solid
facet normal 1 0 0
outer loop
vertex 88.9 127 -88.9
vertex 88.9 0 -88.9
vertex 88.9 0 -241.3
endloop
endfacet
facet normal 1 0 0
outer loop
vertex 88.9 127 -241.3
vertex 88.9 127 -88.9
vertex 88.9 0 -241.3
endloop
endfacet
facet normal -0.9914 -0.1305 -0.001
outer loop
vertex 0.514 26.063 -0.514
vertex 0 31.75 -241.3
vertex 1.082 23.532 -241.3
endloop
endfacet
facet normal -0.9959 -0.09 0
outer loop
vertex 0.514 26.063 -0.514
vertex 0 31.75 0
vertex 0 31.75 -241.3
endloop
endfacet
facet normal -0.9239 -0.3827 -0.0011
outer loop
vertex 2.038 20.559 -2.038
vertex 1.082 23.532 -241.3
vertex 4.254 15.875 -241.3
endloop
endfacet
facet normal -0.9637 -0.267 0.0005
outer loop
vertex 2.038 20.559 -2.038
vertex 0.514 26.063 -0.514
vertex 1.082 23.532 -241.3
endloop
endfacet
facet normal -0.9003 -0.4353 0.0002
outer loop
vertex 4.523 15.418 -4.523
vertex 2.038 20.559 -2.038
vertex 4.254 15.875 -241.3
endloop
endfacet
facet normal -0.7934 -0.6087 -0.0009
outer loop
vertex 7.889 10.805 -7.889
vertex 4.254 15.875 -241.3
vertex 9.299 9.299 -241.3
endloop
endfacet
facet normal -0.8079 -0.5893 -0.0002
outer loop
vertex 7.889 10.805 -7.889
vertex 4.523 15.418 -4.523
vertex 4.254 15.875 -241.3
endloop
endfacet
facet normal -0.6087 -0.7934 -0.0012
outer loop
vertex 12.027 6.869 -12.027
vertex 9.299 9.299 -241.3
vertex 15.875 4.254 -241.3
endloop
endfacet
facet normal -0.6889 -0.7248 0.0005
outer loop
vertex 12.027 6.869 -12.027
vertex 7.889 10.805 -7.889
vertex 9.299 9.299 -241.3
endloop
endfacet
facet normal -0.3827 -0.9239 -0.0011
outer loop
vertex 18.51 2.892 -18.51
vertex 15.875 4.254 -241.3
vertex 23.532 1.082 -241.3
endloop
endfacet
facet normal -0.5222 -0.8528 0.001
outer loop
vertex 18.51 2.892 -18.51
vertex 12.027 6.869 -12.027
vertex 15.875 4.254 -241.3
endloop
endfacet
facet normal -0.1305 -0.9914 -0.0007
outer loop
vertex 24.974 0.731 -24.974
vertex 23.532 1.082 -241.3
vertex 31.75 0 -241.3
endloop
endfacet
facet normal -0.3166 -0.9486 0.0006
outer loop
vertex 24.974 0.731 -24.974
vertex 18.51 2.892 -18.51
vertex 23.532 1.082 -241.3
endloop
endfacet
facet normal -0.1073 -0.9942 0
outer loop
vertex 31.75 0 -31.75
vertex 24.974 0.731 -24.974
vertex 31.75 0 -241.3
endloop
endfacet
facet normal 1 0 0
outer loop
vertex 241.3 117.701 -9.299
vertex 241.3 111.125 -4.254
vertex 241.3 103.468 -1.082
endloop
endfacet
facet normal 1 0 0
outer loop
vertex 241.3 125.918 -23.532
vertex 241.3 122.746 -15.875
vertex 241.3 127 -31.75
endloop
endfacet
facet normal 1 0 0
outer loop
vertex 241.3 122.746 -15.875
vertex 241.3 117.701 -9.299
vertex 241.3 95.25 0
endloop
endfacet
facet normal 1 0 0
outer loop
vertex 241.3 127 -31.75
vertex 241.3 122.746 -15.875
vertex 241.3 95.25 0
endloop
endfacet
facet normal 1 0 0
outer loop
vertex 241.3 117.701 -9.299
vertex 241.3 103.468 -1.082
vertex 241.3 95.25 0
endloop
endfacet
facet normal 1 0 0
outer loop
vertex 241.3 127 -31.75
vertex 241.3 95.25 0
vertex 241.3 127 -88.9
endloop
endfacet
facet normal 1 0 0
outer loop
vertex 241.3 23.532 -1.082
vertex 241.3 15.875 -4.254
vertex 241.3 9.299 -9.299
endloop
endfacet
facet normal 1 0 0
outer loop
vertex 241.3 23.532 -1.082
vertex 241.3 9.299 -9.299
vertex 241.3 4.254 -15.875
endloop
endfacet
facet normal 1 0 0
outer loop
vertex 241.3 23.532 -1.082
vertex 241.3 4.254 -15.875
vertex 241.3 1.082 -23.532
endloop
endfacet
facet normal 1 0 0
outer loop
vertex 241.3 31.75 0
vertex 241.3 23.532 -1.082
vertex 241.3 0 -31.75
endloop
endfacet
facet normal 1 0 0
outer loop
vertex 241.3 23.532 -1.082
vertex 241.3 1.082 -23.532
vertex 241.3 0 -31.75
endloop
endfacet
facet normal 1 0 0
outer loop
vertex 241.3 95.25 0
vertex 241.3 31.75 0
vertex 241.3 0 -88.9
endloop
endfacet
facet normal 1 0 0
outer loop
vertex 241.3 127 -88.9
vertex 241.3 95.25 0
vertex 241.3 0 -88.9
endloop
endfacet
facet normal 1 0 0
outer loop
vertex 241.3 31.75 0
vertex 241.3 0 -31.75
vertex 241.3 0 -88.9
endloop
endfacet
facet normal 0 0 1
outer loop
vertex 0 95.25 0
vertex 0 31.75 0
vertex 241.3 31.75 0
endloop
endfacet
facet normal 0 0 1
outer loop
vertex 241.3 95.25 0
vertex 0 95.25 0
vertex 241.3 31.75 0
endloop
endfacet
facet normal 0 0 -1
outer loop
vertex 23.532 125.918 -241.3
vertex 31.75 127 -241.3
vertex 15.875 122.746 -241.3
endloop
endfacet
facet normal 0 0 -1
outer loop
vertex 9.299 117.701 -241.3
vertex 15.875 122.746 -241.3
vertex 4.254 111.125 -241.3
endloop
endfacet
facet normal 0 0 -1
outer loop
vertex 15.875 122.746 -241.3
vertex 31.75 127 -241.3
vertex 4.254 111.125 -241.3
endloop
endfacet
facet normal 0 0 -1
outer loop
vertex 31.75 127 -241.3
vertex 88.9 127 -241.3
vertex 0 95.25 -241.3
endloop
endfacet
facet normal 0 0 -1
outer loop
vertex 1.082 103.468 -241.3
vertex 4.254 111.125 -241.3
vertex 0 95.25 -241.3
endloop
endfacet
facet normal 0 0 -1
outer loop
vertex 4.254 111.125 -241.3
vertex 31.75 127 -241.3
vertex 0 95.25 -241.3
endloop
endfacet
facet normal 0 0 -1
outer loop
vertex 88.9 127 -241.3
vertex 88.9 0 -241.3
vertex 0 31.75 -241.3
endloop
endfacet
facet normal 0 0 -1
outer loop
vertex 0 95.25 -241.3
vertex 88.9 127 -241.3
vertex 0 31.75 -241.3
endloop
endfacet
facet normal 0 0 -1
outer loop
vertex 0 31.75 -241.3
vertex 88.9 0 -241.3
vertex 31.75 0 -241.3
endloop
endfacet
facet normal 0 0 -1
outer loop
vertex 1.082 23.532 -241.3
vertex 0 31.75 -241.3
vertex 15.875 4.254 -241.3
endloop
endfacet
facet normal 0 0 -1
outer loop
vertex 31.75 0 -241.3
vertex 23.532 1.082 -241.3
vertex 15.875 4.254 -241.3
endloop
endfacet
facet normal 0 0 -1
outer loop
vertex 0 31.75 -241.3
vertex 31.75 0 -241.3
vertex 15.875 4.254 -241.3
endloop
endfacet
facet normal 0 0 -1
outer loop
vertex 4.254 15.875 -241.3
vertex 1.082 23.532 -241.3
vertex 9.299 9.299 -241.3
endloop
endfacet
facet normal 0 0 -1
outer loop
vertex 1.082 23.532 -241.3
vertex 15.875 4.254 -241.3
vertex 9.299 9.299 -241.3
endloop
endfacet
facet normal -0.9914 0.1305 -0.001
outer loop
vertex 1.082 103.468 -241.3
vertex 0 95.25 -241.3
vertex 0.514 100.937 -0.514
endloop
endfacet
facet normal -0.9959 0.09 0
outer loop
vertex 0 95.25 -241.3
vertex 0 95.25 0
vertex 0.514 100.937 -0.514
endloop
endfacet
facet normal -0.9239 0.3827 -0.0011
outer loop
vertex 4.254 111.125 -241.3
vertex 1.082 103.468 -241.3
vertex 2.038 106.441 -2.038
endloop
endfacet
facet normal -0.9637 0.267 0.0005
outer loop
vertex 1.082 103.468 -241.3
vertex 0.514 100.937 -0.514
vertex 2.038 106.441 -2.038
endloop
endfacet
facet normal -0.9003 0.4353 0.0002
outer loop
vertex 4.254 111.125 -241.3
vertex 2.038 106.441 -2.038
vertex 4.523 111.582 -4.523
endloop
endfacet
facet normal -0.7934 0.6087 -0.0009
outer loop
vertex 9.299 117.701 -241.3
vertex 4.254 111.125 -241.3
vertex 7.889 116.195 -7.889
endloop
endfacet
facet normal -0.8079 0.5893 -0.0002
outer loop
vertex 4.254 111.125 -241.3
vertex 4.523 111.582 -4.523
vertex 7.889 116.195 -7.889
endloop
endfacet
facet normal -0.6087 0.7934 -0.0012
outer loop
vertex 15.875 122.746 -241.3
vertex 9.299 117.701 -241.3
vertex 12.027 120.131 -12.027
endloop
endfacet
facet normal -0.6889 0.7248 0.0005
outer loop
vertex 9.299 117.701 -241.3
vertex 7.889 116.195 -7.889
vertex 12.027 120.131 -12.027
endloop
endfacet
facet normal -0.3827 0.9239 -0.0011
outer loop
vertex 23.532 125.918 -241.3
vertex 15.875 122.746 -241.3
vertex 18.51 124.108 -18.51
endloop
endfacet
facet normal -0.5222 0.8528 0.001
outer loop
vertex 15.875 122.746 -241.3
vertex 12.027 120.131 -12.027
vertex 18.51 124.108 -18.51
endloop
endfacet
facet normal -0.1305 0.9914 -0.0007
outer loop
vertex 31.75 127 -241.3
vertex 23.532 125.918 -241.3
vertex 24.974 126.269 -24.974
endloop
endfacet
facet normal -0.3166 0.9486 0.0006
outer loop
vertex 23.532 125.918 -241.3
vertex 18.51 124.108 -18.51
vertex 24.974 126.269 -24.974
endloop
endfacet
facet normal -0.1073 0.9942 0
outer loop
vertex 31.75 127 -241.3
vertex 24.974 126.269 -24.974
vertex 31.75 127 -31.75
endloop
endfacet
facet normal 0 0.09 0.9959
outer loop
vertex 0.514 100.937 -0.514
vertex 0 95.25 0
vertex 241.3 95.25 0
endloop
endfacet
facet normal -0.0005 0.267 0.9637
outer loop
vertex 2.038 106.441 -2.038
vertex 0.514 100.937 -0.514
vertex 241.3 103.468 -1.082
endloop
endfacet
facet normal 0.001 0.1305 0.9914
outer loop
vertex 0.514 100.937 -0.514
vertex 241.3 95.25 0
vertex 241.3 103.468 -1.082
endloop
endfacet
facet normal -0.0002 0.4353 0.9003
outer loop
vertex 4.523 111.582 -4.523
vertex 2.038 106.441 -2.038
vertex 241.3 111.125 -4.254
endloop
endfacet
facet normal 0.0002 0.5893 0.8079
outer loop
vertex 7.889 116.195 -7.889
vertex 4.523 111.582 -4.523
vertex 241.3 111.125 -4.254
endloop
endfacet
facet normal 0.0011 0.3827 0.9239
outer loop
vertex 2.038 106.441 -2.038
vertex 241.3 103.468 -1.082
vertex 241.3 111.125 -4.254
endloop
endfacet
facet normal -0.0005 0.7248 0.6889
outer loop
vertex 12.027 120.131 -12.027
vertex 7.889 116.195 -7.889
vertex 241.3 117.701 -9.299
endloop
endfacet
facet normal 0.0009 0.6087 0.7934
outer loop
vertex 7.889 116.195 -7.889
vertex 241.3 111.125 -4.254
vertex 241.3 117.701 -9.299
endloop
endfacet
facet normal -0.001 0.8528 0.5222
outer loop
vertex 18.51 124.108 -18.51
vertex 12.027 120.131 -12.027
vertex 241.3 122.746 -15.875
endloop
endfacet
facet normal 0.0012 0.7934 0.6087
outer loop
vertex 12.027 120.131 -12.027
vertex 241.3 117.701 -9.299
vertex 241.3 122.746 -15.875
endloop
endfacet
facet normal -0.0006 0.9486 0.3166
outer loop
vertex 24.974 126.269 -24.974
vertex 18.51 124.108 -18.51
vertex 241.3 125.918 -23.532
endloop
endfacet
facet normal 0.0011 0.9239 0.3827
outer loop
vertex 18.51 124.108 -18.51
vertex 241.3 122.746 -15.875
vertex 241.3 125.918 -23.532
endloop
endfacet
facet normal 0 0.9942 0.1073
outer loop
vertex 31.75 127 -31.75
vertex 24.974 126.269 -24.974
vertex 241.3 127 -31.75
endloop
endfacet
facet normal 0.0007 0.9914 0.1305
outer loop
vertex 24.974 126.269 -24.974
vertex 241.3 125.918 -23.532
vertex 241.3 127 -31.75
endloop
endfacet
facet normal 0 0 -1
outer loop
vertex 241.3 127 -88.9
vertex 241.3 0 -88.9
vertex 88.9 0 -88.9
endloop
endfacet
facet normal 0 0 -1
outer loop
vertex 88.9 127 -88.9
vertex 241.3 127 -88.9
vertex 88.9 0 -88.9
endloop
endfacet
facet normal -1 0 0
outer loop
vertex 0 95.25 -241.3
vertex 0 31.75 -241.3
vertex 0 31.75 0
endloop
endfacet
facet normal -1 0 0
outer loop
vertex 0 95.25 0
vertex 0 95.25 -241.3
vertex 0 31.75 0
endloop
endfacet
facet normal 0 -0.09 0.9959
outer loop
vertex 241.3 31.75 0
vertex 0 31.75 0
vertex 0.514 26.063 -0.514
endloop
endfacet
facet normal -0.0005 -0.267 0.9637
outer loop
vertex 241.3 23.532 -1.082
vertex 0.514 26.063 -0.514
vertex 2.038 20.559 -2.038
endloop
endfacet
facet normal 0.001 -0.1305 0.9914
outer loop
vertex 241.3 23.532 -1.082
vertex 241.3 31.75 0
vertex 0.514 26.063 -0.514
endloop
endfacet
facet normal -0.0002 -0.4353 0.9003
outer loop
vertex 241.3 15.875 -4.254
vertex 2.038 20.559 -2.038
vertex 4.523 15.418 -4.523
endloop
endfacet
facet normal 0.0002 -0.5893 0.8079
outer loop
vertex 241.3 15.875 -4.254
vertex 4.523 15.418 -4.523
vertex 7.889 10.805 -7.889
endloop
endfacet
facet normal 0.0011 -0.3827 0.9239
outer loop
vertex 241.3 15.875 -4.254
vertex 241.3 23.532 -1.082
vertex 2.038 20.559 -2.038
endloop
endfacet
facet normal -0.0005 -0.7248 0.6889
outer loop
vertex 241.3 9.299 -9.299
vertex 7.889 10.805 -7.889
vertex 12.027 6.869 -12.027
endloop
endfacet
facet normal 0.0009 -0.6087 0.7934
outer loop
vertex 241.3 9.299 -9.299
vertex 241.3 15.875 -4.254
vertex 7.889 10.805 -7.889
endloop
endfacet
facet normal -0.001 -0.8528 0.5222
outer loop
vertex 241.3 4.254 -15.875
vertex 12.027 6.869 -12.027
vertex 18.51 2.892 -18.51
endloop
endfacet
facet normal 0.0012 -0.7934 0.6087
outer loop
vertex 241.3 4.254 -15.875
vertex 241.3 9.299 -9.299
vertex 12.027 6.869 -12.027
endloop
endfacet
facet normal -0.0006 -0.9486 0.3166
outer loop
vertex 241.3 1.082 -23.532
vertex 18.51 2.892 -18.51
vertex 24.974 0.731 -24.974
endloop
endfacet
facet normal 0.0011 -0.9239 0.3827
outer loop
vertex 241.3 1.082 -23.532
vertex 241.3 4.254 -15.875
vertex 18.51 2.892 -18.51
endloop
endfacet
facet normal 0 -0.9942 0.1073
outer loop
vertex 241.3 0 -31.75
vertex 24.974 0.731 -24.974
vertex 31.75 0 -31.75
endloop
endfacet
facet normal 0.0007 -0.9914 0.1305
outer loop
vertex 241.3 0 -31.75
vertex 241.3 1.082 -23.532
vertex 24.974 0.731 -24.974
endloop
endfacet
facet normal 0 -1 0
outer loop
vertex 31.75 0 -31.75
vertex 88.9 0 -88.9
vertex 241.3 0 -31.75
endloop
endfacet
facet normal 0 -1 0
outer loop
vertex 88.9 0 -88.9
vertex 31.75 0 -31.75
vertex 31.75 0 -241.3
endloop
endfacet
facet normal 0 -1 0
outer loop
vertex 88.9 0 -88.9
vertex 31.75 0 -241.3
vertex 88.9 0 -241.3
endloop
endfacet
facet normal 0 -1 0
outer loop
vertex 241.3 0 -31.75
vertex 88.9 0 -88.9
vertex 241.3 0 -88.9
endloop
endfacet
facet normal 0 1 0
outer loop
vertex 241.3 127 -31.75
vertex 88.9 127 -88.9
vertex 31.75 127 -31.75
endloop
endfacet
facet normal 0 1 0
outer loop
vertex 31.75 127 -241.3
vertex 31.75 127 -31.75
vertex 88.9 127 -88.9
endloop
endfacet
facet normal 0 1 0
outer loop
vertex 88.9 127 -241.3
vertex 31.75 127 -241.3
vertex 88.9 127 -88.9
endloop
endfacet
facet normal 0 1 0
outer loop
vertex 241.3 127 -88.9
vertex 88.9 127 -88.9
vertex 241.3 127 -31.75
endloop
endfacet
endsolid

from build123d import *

# Parameters (mm, degrees)
BOSS_EXTRUDE1_DEPTH = 127
FILLET1_R           = 31.75


with BuildPart() as part:
    # Sketch1 → Boss-Extrude1 (new body)
    with BuildSketch(Plane(origin=(0, 0, 0), x_dir=(1, 0, 0), z_dir=(0, 1, 0))):
        Polygon((88.9, 88.9), (88.9, 241.3), (0, 241.3), (0, 0), (241.3, 0), (241.3, 88.9), align=None)
    extrude(amount=BOSS_EXTRUDE1_DEPTH)

    # Fillet1
    fillet1_edges = [part.edges().sort_by_distance(p)[0] for p in [
        (0, 127, -120.65),
        (120.65, 127, 0),
        (120.65, 0, 0),
        (0, 0, -120.65),
    ]]
    fillet(fillet1_edges, radius=FILLET1_R)


solid = part.part
